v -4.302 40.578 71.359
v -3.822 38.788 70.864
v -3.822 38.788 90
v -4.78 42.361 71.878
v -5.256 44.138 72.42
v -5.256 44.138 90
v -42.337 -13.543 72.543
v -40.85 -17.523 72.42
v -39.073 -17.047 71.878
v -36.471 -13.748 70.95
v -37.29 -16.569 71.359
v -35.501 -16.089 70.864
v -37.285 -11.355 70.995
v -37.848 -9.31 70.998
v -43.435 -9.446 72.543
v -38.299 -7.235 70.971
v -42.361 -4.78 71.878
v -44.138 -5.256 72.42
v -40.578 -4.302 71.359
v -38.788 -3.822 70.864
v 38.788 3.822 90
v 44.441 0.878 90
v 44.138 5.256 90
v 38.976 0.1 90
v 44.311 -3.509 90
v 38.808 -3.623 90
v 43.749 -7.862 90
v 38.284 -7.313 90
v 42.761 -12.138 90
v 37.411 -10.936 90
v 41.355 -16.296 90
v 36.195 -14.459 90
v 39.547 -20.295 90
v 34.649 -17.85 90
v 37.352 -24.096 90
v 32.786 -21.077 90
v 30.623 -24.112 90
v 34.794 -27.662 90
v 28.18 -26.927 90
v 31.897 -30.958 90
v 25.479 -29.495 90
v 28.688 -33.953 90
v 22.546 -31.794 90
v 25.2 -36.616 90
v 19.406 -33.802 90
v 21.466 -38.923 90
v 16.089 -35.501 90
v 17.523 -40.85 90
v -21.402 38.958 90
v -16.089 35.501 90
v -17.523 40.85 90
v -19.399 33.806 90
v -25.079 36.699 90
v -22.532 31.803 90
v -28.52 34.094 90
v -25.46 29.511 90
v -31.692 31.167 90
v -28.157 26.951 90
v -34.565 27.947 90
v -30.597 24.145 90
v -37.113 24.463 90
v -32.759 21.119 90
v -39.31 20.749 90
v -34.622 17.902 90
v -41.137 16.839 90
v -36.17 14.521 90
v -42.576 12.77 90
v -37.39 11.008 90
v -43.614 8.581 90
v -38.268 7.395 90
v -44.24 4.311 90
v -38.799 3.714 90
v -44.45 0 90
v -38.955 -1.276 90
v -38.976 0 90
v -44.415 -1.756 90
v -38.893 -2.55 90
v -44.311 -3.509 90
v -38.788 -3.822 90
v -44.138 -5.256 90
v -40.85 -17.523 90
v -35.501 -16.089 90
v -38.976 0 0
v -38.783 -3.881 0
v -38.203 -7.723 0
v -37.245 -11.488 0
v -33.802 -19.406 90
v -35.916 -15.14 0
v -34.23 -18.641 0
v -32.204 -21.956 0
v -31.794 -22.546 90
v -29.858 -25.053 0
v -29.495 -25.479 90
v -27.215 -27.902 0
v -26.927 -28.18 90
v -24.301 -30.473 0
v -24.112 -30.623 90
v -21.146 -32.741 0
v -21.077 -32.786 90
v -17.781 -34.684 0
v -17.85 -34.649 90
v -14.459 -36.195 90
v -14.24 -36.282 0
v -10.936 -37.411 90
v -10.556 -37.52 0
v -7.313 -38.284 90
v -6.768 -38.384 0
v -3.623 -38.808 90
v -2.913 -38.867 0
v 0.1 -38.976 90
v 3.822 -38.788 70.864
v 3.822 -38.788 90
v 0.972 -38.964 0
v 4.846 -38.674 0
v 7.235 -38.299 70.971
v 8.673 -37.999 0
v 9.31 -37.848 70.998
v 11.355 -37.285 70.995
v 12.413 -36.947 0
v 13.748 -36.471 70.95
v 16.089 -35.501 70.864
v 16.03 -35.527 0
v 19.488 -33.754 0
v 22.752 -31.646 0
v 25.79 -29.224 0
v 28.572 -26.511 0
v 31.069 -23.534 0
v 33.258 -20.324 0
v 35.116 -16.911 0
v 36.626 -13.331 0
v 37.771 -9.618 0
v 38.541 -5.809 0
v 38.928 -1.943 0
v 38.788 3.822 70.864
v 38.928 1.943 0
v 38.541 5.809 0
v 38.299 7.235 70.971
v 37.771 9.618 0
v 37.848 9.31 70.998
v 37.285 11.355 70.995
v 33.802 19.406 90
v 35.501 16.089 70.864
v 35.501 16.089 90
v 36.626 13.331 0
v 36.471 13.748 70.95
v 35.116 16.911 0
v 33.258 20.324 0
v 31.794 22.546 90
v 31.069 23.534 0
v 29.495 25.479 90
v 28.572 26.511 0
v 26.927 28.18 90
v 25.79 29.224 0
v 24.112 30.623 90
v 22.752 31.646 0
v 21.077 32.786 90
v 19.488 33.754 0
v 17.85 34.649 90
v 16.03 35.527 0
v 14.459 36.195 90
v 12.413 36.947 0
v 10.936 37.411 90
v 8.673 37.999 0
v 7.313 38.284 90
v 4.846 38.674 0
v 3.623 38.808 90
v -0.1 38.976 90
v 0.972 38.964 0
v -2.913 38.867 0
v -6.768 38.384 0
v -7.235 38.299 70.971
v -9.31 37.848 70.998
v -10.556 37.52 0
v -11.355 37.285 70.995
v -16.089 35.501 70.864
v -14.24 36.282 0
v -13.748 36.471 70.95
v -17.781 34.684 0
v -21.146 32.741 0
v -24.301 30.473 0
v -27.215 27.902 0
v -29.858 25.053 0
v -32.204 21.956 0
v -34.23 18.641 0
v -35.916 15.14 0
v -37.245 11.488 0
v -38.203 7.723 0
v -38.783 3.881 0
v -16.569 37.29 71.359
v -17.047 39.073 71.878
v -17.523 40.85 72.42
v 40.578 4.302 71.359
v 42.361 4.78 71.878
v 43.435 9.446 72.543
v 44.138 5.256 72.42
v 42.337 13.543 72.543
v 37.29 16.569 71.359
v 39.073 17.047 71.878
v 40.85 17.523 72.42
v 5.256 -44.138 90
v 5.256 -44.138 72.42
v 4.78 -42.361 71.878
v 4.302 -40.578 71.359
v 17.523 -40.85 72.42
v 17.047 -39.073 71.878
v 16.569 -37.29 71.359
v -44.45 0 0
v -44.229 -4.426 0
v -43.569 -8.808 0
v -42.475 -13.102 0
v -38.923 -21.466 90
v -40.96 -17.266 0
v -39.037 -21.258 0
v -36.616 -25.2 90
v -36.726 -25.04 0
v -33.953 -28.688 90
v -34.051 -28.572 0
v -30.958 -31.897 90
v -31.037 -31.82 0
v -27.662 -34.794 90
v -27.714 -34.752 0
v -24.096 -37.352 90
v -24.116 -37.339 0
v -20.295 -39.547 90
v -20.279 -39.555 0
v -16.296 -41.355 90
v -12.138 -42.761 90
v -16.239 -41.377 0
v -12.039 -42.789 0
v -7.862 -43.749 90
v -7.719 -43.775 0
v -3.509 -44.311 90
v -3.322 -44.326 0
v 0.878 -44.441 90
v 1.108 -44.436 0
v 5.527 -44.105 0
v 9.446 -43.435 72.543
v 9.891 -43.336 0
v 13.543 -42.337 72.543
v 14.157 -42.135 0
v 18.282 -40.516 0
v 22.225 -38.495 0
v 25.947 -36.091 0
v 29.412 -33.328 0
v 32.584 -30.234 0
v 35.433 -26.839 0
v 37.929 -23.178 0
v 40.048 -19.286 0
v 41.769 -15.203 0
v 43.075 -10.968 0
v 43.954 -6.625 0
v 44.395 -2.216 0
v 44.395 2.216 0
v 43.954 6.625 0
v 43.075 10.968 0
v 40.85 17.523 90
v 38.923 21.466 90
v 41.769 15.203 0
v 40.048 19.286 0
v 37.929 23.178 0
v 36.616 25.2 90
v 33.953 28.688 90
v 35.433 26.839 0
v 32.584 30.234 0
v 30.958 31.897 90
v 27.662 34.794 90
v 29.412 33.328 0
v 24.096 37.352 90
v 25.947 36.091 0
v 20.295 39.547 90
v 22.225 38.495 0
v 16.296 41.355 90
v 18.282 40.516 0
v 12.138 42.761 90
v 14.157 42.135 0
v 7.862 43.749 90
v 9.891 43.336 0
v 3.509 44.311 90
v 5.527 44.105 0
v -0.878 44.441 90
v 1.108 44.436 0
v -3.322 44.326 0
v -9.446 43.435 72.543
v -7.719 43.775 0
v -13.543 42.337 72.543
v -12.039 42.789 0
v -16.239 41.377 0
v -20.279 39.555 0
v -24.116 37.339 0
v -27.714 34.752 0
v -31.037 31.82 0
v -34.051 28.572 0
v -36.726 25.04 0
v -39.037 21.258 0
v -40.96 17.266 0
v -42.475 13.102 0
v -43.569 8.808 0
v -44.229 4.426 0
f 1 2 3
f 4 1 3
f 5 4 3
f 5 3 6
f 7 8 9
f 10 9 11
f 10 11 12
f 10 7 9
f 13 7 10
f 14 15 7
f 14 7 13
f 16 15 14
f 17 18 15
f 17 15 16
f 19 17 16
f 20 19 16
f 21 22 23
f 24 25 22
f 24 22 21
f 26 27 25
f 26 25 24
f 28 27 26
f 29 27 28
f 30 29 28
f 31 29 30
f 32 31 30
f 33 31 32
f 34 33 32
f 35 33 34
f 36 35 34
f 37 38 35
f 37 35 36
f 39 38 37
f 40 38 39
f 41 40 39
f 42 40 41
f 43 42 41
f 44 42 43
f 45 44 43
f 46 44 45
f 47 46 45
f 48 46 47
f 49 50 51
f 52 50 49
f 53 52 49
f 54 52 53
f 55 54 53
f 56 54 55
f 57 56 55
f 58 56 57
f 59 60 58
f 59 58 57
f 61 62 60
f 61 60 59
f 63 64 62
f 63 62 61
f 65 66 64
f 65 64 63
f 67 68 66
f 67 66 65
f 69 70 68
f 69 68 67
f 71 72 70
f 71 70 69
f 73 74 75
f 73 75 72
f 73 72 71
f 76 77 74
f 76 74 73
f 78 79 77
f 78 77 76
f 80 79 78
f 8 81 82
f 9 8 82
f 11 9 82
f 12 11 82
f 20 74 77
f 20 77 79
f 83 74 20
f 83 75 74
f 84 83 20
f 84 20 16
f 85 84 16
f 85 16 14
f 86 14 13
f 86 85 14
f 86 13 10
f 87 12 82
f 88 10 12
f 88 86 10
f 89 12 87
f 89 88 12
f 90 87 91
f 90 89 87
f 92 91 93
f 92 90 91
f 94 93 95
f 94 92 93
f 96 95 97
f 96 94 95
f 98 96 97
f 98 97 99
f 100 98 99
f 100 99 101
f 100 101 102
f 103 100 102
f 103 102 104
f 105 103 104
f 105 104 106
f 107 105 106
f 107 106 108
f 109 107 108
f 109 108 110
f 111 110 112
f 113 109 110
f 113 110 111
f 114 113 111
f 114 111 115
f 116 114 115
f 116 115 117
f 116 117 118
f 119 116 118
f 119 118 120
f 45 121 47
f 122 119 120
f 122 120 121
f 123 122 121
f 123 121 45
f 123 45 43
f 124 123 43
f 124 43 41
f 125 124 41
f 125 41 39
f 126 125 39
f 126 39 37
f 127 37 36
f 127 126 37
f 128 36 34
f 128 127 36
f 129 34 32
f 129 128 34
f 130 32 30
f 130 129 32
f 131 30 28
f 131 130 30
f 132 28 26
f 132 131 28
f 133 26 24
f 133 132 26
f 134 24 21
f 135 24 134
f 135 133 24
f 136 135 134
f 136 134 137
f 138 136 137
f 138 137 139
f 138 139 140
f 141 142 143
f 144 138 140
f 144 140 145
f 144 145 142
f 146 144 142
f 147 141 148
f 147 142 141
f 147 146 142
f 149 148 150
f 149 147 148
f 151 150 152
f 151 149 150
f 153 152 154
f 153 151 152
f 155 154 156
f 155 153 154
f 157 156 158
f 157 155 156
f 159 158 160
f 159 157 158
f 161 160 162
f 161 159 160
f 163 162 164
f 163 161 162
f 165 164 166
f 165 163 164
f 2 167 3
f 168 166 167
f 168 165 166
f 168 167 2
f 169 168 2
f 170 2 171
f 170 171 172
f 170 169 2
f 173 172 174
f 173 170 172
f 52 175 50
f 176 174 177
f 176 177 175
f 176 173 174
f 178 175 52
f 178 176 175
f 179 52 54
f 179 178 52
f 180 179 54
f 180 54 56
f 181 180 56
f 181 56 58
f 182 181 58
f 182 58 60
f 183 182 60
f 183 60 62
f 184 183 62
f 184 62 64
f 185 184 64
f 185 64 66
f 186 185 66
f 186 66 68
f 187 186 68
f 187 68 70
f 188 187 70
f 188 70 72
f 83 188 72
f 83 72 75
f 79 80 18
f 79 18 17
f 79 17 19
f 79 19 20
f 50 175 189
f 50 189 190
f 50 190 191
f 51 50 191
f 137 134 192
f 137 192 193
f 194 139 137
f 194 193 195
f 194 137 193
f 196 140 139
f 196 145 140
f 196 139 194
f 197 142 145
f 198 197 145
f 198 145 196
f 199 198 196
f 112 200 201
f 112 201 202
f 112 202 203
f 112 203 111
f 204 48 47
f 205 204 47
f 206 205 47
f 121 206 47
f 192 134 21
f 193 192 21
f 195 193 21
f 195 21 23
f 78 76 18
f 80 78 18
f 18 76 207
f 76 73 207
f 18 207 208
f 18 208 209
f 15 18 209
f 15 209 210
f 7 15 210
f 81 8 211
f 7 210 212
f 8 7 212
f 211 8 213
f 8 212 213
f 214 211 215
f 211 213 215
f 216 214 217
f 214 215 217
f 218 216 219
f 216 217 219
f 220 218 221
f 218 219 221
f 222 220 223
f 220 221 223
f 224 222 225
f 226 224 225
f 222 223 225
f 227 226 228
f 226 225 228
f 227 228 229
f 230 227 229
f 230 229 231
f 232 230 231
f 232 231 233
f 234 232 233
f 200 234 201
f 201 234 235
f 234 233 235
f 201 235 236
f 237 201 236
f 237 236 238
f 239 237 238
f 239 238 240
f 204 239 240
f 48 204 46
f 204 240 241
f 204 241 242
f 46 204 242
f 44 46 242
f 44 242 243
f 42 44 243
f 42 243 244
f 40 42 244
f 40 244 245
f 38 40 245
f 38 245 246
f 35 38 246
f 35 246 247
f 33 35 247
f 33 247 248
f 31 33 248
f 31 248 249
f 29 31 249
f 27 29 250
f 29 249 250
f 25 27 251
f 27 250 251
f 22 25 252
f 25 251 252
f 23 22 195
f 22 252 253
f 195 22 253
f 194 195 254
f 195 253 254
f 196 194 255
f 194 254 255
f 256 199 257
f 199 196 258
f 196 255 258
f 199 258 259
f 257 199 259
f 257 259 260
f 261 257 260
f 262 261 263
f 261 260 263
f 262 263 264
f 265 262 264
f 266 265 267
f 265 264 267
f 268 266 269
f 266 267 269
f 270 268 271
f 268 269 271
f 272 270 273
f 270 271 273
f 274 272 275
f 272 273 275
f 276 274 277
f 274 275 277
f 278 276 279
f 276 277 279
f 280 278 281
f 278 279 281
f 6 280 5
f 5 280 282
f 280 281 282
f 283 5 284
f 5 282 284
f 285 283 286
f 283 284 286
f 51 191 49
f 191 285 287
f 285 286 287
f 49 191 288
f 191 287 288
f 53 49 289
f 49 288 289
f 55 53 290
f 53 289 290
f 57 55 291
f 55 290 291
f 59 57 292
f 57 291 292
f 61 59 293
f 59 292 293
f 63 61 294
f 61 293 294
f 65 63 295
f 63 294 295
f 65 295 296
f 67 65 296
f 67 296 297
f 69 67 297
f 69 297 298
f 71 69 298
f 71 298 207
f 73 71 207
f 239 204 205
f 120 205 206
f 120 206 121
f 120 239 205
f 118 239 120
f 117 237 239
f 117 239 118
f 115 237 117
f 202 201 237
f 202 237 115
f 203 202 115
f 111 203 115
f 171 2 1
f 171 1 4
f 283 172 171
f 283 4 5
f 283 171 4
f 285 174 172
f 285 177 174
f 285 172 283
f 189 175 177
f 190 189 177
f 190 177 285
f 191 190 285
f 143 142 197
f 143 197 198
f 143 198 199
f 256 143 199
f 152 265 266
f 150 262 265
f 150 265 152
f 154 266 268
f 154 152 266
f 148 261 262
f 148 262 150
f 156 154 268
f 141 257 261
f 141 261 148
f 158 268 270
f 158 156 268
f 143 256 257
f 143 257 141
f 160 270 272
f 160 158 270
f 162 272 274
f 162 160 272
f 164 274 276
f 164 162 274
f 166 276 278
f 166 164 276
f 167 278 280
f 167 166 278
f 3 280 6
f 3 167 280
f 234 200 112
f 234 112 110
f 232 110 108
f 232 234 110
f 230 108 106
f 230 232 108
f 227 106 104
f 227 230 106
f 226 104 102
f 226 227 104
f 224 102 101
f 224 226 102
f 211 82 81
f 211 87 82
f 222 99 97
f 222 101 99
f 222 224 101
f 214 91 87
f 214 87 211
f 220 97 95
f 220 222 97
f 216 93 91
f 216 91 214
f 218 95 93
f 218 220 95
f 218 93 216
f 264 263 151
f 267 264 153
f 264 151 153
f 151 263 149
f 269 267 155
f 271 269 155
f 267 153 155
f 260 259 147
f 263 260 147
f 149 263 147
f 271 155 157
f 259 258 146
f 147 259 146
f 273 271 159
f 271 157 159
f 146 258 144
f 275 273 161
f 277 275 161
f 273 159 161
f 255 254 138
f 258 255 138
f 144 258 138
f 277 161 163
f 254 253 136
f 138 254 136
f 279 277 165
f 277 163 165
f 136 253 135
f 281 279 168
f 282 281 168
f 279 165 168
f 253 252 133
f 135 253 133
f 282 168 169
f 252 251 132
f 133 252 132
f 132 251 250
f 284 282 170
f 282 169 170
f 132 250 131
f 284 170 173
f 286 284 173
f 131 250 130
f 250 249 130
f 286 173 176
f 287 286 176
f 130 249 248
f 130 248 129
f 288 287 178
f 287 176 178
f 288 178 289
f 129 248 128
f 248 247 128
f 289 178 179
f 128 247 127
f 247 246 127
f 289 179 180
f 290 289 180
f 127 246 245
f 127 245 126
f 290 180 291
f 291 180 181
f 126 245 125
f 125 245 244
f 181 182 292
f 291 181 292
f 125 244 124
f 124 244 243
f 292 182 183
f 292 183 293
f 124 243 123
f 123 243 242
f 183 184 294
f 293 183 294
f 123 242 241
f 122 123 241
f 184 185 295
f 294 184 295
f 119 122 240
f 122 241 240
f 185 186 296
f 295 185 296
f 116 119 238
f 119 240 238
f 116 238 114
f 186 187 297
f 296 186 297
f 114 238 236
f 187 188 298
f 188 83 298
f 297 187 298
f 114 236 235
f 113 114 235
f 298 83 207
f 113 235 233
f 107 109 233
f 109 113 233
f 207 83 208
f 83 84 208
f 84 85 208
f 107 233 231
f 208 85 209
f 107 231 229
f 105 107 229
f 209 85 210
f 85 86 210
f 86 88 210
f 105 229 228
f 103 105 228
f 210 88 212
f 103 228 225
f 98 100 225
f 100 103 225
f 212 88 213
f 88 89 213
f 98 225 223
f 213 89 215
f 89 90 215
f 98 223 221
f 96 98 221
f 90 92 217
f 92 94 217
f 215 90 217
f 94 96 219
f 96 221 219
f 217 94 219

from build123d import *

# Parameters (mm, degrees)
SKETCH1_R           = 44.45
SKETCH1_R_2         = 38.9763
BOSS_EXTRUDE1_DEPTH = 90
CAVITY1_START       = -6.35
CAVITY1_DEPTH       = 12.7
CAVITY1_2_DEPTH     = 12.7


# Read off the part's stored shape, not the designer's step: Cavity1
with BuildPart() as part:
    # Sketch1 → Boss-Extrude1 (new body)
    with BuildSketch(Plane.XY):
        with Locations(Location((0, 0, 0), (0, 0, 180))):
            Circle(SKETCH1_R)
        with Locations(Location((0, 0, 0), (0, 0, 180))):
            Circle(SKETCH1_R_2, mode=Mode.SUBTRACT)
    extrude(amount=BOSS_EXTRUDE1_DEPTH)

    # Cavity1 outline → Cavity1 (cut)
    with BuildSketch(Plane(origin=(0, 0, 0), x_dir=(-0.258888878578149, 0.9659071117600018, 0), z_dir=(0.9659071117600018, 0.25888887857814896, 0)).offset(CAVITY1_START)):
        with BuildLine():
            ThreePointArc((38.455551767, 70.863594779), (41.461594511, 71.680385005), (44.450315107, 72.558444487))
            Line((44.450315107, 72.558444487), (46, 73.030985488))
            Line((46, 73.030985488), (46, 90))
            Line((46, 90), (-46, 90))
            Line((-46, 90), (-46, 73.030985488))
            Line((-46, 73.030985488), (-44.450315107, 72.558444487))
            ThreePointArc((-44.450315107, 72.558444487), (-41.461594511, 71.680385005), (-38.455551767, 70.863594779))
            Line((-38.455551767, 70.863594779), (-31.309084293, 69))
            Line((-31.309084293, 69), (31.309084293, 69))
            Line((31.309084293, 69), (38.455551767, 70.863594779))
        make_face()
    extrude(amount=CAVITY1_DEPTH, mode=Mode.SUBTRACT)

    # Cavity1 2 outline → Cavity1 2 (cut)
    with BuildSketch(Plane(origin=(0, 0, 0), x_dir=(0.9659071117600018, 0.258888878578149, 0), z_dir=(0.25888887857814896, -0.9659071117600018, 0)).offset(CAVITY1_START)):
        with BuildLine():
            ThreePointArc((38.455551767, 70.863594779), (41.461594511, 71.680385005), (44.450315107, 72.558444487))
            Line((44.450315107, 72.558444487), (46, 73.030985488))
            Line((46, 73.030985488), (46, 90))
            Line((46, 90), (-46, 90))
            Line((-46, 90), (-46, 73.030985488))
            Line((-46, 73.030985488), (-44.450315107, 72.558444487))
            ThreePointArc((-44.450315107, 72.558444487), (-41.461594511, 71.680385005), (-38.455551767, 70.863594779))
            Line((-38.455551767, 70.863594779), (-31.309084293, 69))
            Line((-31.309084293, 69), (31.309084293, 69))
            Line((31.309084293, 69), (38.455551767, 70.863594779))
        make_face()
    extrude(amount=CAVITY1_2_DEPTH, mode=Mode.SUBTRACT)


solid = part.part
